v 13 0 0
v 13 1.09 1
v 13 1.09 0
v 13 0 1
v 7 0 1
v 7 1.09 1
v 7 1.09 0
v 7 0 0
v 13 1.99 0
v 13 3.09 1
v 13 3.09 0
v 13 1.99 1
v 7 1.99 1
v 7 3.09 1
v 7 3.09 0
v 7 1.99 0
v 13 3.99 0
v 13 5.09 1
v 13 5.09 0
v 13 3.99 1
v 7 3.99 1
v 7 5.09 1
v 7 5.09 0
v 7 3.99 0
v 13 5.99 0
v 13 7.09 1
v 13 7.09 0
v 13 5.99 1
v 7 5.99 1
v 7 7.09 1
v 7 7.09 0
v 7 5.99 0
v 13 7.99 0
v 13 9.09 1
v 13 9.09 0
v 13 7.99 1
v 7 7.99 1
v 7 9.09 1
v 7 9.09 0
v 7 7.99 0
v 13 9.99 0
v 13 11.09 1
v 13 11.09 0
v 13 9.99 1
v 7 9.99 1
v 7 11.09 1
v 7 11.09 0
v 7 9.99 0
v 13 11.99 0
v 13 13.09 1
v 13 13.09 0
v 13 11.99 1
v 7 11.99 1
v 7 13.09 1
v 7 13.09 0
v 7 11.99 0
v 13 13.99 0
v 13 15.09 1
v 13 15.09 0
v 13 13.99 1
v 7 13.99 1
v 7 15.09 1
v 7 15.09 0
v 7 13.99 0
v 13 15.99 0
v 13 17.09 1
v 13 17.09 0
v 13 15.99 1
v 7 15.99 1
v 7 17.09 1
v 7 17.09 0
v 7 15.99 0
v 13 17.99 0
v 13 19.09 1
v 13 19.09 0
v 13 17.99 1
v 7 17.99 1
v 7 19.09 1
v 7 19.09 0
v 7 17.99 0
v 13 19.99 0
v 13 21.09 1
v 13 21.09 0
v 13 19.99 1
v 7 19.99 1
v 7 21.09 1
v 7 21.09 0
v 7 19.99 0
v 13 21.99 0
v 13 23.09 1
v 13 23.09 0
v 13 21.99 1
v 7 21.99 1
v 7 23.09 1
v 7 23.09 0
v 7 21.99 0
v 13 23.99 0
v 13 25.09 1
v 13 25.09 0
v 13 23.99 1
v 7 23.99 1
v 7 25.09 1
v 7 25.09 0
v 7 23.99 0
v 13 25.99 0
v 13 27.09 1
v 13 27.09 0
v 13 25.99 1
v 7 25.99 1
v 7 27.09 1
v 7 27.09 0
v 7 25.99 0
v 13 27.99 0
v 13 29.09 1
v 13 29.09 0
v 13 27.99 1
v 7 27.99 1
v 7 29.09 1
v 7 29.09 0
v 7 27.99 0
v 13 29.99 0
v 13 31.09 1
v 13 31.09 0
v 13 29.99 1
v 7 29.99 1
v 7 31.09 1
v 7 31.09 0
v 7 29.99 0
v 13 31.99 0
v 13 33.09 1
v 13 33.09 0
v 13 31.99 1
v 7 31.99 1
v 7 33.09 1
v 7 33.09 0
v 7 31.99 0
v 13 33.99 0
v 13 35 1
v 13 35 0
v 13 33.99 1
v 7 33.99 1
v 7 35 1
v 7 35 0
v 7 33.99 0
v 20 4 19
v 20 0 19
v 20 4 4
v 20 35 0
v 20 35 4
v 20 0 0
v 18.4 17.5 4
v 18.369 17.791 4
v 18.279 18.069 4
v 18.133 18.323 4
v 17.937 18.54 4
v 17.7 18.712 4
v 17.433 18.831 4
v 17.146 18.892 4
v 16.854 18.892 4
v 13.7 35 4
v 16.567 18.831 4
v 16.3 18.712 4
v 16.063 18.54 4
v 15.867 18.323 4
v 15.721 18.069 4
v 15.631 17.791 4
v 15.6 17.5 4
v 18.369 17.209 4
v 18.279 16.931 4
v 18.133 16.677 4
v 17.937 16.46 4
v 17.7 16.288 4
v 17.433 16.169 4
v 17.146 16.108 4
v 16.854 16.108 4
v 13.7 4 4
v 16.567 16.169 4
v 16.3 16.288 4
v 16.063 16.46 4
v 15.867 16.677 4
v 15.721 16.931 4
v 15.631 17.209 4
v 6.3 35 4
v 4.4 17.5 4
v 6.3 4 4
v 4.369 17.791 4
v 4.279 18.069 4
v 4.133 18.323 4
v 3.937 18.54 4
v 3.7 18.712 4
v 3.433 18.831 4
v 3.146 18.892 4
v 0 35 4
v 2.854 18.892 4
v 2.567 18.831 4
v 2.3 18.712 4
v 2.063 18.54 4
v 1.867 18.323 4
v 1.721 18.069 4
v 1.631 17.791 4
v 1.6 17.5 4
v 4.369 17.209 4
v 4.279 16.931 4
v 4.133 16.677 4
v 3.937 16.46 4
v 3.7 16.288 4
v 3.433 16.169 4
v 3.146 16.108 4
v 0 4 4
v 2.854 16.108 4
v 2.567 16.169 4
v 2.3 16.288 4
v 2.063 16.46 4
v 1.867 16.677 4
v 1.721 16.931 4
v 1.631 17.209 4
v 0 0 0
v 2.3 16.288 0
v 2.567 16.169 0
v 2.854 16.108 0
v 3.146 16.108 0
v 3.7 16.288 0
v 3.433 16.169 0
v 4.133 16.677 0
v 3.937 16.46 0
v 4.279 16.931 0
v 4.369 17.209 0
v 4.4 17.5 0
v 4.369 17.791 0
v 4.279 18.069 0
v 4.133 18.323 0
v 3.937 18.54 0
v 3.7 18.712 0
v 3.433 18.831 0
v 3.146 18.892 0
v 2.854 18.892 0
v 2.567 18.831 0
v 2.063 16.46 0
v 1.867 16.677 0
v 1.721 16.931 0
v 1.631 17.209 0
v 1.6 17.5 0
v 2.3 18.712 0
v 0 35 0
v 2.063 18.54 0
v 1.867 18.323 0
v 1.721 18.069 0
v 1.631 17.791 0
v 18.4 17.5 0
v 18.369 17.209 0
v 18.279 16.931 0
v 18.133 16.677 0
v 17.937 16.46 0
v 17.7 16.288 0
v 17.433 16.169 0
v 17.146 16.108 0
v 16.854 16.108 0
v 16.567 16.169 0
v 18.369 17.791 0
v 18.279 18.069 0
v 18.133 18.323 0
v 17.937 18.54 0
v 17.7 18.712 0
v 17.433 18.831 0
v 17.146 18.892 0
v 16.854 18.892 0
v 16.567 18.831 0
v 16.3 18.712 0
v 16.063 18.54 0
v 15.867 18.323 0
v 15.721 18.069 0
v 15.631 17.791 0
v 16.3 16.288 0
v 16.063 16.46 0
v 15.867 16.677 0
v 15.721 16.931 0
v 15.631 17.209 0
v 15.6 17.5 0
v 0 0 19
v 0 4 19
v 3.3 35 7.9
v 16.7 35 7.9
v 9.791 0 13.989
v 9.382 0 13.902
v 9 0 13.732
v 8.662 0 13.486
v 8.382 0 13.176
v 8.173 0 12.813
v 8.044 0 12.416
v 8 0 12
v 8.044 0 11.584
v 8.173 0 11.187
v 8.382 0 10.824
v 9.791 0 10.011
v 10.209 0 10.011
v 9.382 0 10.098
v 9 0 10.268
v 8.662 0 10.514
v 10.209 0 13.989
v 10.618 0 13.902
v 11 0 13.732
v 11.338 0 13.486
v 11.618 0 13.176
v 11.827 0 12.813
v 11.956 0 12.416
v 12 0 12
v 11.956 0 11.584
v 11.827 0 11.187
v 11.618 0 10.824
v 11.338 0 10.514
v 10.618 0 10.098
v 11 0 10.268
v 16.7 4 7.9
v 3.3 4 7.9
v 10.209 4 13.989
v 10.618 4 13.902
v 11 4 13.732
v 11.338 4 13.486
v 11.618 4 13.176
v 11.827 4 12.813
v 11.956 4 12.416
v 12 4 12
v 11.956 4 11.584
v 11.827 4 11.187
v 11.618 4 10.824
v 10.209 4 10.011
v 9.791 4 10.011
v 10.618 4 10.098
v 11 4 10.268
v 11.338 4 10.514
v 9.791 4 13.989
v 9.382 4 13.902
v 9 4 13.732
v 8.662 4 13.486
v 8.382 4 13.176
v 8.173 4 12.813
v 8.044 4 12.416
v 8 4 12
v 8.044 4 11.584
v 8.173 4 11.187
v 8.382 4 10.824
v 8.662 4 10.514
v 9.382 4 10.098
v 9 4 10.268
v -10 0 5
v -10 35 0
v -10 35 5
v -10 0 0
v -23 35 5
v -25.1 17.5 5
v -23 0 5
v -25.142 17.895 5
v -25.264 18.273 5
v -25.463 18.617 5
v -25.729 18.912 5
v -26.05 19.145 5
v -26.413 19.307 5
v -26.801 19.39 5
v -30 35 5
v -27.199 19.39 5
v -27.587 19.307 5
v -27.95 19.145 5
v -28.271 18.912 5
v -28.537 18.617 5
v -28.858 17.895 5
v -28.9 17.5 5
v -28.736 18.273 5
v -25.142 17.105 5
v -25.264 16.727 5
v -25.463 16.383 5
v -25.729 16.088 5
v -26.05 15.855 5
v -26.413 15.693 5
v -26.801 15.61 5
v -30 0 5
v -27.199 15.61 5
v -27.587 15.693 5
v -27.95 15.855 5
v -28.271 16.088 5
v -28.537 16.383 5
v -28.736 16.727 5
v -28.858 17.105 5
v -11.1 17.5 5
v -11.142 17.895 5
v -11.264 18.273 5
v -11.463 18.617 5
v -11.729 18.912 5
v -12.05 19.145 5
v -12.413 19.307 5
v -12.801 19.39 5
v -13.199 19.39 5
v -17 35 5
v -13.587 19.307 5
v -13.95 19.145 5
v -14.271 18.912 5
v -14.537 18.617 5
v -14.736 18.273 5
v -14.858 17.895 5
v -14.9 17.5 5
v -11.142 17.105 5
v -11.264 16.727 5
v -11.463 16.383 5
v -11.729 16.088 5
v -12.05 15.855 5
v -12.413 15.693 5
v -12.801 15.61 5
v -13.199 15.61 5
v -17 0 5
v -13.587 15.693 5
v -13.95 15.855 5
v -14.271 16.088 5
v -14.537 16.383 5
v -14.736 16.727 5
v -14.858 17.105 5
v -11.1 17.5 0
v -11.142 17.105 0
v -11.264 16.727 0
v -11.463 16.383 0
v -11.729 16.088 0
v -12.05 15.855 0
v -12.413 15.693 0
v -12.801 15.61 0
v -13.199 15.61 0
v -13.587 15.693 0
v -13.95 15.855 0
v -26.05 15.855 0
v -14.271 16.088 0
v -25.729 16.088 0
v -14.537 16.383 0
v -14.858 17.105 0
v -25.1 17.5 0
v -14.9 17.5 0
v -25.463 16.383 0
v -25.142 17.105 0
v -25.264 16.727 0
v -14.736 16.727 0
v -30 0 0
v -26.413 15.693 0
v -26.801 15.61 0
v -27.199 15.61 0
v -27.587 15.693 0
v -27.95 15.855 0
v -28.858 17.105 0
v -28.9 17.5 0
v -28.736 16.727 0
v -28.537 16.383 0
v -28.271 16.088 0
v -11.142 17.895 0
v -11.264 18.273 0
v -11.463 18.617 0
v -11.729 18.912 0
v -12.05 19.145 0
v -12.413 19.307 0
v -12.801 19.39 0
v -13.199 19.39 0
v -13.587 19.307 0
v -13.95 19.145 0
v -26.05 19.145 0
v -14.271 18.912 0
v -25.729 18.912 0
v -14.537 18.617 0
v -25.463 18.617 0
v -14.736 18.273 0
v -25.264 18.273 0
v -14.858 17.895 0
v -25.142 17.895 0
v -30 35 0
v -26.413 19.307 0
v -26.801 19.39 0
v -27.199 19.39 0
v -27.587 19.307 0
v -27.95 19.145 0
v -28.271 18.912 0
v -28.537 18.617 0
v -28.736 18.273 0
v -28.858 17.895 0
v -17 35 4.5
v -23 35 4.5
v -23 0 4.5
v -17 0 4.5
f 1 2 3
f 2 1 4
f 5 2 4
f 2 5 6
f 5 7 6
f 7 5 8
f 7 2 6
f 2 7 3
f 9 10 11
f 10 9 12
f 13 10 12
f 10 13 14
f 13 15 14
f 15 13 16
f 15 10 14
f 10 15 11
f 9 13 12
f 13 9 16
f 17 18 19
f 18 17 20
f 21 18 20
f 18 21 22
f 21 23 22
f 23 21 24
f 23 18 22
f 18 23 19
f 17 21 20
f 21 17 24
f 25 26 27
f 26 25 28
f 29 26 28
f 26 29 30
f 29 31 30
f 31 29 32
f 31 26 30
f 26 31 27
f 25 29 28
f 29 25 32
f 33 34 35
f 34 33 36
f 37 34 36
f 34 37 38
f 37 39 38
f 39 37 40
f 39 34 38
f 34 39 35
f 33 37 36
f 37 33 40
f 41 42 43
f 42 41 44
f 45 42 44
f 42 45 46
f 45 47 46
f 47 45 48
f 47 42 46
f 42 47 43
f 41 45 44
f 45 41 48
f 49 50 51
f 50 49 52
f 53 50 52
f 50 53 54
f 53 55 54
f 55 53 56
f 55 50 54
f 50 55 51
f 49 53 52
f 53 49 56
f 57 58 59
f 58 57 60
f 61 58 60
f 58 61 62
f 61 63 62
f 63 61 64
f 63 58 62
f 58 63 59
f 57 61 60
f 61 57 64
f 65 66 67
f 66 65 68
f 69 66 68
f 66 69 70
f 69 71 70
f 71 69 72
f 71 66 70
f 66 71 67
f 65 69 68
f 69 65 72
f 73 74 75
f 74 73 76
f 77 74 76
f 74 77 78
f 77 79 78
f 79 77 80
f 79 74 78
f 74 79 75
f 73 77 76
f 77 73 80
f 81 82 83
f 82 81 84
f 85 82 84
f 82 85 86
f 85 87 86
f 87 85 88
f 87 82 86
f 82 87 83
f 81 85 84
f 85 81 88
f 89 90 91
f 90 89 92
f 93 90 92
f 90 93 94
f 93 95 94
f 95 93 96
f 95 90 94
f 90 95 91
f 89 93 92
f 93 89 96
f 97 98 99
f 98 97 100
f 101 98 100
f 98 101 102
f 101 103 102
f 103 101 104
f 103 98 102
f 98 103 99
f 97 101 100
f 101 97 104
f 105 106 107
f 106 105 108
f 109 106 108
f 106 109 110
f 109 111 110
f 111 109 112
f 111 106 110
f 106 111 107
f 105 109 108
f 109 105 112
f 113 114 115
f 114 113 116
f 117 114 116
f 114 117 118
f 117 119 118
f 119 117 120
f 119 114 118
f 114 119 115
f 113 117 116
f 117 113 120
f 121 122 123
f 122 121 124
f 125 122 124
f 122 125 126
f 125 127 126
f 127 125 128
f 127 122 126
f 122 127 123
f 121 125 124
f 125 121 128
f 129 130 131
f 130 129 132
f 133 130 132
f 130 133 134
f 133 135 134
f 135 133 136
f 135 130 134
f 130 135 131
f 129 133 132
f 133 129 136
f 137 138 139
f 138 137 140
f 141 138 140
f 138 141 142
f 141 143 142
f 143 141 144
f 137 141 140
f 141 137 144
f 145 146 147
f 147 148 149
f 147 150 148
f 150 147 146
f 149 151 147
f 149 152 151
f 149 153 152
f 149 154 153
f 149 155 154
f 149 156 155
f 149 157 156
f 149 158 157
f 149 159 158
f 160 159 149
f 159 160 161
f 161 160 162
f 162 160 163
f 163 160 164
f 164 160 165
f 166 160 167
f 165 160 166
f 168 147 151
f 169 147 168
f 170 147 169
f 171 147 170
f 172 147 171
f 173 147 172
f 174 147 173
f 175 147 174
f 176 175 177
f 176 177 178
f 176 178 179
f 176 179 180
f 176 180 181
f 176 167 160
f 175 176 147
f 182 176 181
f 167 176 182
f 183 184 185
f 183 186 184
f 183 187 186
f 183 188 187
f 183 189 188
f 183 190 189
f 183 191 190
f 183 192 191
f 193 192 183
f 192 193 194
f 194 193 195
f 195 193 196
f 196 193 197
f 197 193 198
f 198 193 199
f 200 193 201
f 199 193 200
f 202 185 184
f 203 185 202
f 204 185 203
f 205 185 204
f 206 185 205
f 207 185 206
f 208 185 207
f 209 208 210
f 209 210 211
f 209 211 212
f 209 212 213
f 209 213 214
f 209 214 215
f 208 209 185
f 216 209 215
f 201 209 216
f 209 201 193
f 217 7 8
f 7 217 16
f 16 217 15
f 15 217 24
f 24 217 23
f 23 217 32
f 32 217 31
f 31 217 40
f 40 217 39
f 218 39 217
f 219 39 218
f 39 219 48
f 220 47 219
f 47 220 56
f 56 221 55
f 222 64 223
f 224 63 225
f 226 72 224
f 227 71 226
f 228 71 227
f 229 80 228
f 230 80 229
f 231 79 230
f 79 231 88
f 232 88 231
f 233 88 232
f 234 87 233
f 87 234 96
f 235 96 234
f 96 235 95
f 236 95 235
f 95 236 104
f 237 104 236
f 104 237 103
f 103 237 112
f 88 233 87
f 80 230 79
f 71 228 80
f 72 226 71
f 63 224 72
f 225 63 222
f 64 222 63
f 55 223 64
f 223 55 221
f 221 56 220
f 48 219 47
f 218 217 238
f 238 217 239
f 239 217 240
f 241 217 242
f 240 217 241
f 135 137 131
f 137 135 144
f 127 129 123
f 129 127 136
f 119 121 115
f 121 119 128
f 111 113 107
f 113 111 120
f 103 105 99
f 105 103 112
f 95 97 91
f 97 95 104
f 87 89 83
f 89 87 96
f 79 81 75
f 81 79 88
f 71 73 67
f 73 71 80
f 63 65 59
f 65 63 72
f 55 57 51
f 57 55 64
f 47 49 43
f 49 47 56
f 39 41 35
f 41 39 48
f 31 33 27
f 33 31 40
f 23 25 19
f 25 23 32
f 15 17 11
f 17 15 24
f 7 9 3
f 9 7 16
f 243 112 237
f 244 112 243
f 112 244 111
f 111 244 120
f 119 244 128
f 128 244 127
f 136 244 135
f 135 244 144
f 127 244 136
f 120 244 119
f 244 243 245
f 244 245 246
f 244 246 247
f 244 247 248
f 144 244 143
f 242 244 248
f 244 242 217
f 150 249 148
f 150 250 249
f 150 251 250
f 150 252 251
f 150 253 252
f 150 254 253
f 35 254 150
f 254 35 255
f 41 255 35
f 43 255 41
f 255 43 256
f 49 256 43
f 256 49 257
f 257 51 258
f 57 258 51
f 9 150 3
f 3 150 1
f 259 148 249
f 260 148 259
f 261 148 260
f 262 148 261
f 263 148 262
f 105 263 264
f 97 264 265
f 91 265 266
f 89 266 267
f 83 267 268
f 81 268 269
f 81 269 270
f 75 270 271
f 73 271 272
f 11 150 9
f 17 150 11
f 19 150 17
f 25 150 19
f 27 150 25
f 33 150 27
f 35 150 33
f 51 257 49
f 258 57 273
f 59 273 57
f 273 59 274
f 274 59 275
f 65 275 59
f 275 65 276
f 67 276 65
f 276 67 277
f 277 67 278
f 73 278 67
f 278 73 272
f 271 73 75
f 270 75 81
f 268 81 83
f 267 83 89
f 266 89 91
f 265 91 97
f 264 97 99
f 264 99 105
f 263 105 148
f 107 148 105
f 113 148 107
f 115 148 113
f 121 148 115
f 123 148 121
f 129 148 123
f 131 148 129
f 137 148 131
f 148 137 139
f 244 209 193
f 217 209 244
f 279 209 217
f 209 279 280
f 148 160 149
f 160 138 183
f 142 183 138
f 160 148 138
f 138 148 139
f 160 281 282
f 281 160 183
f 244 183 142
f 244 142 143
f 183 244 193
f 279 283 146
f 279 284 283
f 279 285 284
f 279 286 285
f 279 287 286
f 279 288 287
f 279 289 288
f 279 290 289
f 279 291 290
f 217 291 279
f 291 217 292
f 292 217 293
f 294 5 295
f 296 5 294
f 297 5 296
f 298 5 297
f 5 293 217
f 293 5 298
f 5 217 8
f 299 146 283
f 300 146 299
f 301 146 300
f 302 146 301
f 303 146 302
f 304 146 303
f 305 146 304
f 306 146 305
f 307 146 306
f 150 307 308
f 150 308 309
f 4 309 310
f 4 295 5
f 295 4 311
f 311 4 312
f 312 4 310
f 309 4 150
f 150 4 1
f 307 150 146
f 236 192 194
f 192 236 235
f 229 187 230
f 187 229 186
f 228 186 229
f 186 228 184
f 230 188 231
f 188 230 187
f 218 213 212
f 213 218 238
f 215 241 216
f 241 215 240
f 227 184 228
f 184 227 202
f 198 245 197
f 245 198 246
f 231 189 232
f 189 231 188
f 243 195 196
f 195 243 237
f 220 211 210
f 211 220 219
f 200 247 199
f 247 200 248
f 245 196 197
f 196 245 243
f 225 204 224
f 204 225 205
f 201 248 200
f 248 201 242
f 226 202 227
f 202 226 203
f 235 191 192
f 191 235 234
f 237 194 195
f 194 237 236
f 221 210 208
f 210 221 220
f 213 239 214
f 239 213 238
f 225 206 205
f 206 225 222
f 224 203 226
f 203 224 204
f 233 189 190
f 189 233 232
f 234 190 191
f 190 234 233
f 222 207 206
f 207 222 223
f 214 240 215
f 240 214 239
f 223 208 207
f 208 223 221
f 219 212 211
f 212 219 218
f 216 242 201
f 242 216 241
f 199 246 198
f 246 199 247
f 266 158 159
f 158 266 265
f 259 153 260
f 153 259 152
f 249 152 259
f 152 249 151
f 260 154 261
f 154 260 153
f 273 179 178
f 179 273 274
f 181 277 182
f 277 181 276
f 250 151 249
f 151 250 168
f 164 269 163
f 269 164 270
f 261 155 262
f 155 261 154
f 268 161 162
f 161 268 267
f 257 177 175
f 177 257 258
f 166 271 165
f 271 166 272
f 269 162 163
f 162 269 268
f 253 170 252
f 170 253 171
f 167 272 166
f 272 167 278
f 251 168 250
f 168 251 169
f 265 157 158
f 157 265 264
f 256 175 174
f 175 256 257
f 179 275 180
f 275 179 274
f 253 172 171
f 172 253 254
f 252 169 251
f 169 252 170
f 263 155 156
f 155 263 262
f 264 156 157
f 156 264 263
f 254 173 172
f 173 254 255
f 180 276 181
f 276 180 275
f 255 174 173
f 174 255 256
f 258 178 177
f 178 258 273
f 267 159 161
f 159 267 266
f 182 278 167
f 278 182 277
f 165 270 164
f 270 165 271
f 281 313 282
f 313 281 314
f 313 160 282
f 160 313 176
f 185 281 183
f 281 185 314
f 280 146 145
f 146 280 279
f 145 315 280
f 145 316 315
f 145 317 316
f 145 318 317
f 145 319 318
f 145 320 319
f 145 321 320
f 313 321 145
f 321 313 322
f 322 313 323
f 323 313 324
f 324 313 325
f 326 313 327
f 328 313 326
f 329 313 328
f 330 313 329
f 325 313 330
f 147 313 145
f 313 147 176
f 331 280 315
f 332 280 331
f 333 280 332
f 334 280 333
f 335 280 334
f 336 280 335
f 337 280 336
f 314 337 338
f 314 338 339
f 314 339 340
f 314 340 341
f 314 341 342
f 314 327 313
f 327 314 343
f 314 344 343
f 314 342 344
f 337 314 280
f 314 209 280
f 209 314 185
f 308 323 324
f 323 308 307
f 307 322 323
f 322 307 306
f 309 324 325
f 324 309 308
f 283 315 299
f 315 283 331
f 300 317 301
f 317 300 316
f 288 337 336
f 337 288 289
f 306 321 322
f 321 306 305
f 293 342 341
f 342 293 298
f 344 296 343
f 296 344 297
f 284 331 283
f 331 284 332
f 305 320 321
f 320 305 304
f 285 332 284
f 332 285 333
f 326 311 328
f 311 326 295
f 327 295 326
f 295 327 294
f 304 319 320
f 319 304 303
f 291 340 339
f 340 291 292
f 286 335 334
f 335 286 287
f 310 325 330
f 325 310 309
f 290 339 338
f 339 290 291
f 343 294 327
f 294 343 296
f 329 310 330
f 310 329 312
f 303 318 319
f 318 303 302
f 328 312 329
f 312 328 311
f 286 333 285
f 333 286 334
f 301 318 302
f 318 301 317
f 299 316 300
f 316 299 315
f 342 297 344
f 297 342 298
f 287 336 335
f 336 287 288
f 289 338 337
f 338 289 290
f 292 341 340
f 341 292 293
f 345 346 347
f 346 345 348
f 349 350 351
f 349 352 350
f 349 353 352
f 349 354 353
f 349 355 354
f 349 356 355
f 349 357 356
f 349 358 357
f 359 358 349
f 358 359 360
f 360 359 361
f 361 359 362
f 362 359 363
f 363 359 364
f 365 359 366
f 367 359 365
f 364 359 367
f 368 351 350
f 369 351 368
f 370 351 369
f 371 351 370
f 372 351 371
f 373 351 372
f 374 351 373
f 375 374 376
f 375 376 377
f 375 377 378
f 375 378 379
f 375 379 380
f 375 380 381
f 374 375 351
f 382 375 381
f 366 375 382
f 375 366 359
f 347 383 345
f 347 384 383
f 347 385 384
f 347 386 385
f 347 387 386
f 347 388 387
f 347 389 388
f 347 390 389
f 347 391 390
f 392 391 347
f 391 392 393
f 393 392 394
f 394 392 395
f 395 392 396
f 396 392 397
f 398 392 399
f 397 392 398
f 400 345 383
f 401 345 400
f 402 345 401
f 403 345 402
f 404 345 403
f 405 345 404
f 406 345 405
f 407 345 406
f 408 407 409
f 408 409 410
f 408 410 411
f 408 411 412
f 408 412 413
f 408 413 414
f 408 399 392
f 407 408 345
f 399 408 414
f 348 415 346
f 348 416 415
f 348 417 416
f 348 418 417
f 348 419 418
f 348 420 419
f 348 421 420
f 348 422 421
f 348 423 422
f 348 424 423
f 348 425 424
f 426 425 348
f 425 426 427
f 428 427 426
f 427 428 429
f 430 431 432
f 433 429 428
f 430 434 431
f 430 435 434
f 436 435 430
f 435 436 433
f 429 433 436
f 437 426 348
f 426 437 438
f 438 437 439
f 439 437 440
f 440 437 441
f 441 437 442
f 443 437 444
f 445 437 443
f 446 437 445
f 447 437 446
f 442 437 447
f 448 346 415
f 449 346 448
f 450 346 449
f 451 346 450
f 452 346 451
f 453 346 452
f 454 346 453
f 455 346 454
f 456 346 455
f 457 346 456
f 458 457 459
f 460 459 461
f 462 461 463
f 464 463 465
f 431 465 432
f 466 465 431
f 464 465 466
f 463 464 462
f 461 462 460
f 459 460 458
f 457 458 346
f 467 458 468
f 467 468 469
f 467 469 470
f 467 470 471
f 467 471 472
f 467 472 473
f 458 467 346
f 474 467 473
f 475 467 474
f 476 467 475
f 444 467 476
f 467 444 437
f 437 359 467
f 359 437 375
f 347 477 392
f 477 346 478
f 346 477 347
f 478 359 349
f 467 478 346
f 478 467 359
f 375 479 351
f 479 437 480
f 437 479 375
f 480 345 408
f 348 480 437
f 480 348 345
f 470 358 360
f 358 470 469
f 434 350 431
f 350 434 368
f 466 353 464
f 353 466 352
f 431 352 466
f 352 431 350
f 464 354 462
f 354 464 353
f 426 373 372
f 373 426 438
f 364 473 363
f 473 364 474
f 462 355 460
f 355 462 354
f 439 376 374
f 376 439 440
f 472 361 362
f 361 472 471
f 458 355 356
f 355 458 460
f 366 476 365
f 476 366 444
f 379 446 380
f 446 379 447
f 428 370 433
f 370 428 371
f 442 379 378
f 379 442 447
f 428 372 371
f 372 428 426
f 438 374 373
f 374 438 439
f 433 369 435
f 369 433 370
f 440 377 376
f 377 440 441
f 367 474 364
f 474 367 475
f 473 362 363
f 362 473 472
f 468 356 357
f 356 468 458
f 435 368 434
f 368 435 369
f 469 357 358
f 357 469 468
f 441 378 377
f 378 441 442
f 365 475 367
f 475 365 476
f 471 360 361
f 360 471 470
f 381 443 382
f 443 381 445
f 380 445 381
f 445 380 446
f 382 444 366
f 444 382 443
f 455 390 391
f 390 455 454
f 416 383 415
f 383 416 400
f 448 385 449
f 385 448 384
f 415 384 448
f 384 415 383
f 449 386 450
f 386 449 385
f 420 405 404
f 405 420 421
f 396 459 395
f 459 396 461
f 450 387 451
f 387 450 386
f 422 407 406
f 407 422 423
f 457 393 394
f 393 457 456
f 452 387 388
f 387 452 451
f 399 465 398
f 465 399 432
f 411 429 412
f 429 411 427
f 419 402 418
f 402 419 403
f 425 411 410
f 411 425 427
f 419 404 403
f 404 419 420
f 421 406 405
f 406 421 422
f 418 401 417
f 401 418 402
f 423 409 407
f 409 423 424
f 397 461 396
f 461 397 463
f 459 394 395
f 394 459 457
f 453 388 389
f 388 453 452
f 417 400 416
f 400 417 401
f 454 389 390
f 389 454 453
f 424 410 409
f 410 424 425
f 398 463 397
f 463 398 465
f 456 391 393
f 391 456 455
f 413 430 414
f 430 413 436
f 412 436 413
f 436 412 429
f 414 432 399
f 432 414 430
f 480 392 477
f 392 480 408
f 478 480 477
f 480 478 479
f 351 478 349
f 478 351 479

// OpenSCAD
module slot(l) {
  polyhedron(
    points=[[0.3,0,0],[13.7,0,0],[13.7,l,0],[0.3,l,0], 
            [3.3,0,3.9],[10.7,0,3.9],[10.7,l,3.9],[3.3,l,3.9]],

    faces=[[0,1,2,3],[7,6,5,4],[3,7,4,0],
           [1,5,6,2],[4,5,1,0],[2,6,7,3],
    ]
  );
}


module tooth(length) {
  union() {
    for (y= [0:2:length]) {
      translate([0,y-0.01,-0.1]) cube([6,1.1,1.1]);
    }
  }
}


union() {
difference() {
  cube([20,35,4]);
  translate([7,0,0]) tooth(35);
  translate([3,17.5,-0.5]) cylinder(5,1.4,1.4, $fn=30);
  translate([17,17.5,-0.5]) cylinder(5,1.4,1.4, $fn=30);
}

translate([17,0,7.9]) rotate([0,180,0]) slot(35);
}


difference(){
  translate([0,0,4]) cube([20,4,15]);
  translate([10,-1,12]) rotate([-90,0,0]) cylinder(6,2,2, $fn=30);
}


translate([-30,0,0])
difference() {
  cube([20,35,5]);
  translate([3,17.5,-0.5]) cylinder(6,1.9,1.9, $fn=30);
  translate([17,17.5,-0.5]) cylinder(6,1.9,1.9, $fn=30);
  translate([7,-0.5,4.5]) cube([6,36,3]);

}
